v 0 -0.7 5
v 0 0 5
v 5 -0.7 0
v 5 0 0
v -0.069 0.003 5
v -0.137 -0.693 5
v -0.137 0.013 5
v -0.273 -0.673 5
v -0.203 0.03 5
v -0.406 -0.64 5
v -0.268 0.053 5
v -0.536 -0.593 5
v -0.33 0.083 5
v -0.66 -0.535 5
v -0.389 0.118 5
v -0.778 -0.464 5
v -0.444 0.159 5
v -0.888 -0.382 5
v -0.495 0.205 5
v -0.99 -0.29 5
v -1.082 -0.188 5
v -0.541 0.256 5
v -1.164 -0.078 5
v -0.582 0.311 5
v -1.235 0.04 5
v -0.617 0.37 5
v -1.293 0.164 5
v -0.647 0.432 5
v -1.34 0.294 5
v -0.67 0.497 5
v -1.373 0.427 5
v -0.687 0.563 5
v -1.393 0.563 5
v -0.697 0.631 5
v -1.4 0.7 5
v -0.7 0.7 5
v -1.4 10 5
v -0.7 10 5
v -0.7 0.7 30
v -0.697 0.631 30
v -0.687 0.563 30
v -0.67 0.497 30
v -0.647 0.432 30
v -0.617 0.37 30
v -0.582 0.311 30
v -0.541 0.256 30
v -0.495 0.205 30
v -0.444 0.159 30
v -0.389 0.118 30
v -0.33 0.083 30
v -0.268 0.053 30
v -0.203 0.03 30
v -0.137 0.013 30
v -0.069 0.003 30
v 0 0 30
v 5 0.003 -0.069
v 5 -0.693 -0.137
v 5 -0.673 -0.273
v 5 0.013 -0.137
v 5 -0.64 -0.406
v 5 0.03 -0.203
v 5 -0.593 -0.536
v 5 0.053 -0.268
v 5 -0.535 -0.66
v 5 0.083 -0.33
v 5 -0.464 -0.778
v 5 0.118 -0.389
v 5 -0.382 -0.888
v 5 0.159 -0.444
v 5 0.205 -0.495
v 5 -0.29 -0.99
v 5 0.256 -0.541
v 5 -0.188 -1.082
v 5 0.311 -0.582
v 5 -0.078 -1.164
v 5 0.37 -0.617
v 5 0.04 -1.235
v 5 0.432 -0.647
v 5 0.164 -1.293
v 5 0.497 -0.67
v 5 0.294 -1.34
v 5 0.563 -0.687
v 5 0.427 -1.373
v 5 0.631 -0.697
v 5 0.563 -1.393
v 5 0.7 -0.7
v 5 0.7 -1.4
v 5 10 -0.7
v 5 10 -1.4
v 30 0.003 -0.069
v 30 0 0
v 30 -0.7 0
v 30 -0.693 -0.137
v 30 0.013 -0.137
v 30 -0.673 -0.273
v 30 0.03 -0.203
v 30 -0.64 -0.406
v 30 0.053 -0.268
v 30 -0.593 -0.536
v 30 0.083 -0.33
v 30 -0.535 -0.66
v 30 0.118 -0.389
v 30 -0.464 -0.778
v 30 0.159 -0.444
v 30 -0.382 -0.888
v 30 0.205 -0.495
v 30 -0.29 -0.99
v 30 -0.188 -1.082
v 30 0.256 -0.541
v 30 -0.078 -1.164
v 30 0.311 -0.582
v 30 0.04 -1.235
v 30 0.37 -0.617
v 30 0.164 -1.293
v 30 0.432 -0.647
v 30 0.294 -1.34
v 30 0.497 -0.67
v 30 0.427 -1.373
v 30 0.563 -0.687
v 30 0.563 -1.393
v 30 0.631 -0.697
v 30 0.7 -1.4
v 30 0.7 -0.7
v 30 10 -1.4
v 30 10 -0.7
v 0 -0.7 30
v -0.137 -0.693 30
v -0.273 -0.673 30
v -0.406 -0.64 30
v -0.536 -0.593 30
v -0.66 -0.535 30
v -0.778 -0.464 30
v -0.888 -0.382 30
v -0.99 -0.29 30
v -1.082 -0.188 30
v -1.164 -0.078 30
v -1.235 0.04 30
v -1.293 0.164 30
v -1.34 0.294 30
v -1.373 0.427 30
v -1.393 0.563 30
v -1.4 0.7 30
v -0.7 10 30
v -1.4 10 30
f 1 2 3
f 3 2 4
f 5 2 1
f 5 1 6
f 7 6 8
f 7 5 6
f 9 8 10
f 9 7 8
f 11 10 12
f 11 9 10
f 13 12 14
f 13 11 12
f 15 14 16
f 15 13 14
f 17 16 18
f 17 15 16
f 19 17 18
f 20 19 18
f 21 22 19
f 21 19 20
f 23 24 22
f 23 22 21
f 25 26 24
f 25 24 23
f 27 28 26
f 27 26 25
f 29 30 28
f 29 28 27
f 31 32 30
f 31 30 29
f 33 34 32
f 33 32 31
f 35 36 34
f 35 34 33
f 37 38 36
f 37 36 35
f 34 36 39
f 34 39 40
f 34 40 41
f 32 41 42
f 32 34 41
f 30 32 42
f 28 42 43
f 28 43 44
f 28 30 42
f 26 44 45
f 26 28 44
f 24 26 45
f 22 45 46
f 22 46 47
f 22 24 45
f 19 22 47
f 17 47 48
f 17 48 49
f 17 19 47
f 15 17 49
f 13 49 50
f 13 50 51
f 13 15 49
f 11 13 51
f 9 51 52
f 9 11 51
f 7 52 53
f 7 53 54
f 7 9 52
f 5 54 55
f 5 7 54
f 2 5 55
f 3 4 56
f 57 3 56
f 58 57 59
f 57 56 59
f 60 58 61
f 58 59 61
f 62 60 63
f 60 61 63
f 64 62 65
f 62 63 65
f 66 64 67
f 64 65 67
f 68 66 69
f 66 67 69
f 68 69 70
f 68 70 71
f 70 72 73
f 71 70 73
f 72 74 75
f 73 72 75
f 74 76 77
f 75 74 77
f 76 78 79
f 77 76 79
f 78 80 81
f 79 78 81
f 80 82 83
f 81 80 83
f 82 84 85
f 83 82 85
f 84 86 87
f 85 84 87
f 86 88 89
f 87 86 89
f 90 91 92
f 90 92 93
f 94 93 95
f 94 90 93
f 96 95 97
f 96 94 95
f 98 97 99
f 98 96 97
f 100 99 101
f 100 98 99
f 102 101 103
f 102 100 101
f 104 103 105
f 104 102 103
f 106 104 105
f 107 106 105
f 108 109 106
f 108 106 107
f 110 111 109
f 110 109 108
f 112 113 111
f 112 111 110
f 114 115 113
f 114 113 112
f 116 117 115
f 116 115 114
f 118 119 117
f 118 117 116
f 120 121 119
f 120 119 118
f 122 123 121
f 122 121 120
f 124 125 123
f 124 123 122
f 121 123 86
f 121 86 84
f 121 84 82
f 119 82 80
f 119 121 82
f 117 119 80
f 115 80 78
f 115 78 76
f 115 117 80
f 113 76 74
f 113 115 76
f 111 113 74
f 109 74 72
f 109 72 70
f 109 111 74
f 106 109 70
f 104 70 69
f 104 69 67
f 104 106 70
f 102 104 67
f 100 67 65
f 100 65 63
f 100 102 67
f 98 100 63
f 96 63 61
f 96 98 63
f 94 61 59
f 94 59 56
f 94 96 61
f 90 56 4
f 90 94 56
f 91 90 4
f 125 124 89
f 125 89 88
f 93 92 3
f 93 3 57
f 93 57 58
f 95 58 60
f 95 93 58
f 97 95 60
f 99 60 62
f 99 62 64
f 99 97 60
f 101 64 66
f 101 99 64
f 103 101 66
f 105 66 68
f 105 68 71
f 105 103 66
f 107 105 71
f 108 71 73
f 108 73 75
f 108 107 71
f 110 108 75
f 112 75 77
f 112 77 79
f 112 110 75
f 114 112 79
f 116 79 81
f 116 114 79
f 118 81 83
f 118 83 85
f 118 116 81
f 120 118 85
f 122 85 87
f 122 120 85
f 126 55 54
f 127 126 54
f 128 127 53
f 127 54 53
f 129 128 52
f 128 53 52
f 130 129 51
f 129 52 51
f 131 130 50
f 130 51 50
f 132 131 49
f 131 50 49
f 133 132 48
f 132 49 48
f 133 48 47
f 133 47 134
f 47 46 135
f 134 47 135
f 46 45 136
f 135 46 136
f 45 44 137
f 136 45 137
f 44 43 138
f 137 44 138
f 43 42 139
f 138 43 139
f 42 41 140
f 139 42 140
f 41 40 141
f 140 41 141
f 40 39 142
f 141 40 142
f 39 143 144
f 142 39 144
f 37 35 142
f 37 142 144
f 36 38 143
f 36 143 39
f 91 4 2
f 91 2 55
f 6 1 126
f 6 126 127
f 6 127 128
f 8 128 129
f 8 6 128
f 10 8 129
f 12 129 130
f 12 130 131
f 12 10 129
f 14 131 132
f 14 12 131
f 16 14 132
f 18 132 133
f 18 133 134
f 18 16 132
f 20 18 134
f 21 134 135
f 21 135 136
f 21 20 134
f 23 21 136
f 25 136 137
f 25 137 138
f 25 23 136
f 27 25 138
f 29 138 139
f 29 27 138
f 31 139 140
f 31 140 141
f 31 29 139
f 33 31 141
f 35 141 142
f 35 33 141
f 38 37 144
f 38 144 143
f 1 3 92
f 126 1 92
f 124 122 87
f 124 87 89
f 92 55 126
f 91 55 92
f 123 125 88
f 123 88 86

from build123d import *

# Parameters (mm, degrees)
BASE_FLANGE1_DEPTH      = 0.7
BREAK_CORNER1_OUTLINE_W = 10
BREAK_CORNER1_OUTLINE_H = 3
BREAK_CORNER1_DEPTH     = 3.535533906
EDGE_FLANGE2_DEPTH      = 25
EDGE_FLANGE2_BEND_DEPTH = 25


# Read off the part's stored shape, not the designer's step: Break-Corner1
# Sheet-metal steps are written as plain solids
with BuildPart() as part:
    # Sketch2 → Base-Flange1 (new body)
    with BuildSketch(Plane(origin=(0, 0, 0), x_dir=(1, 0, 0), z_dir=(0, 1, 0))):
        Polygon((0, 0), (0, -30), (30, 0), align=None)
    extrude(amount=-BASE_FLANGE1_DEPTH)

    # Break-Corner1 outline → Break-Corner1 (cut)
    with BuildSketch(Plane(origin=(0, 0, 0), x_dir=(0.7071067811865471, 0, -0.707106781186548), z_dir=(0.707106781186548, 0, 0.707106781186547))):
        with Locations((0, -0.5)):
            Rectangle(BREAK_CORNER1_OUTLINE_W, BREAK_CORNER1_OUTLINE_H)
    extrude(amount=BREAK_CORNER1_DEPTH, mode=Mode.SUBTRACT)

    # Edge-Flange2 section (across the edge) → Edge-Flange2 (add)
    with BuildSketch(Plane(origin=(-0.7, 0, 5), x_dir=(1, 0, 0), z_dir=(0, 0, 1))):
        with BuildLine():
            Line((-0.7, 0.7), (-0.7, 10))
            Line((-0.7, 10), (0, 10))
            Line((0, 10), (0, 0.7))
            ThreePointArc((0, 0.7), (0.205025253, 0.205025253), (0.7, 0))
            Line((0.7, 0), (0.7, -0.7))
            ThreePointArc((0.7, -0.7), (-0.289949494, -0.289949494), (-0.7, 0.7))
        make_face()
    extrude(amount=EDGE_FLANGE2_DEPTH)

    # Edge-Flange2 section 2 (across the edge) → Edge-Flange2 bend (add)
    with BuildSketch(Plane(origin=(30, 0, -0.7), x_dir=(0, 0, 1), z_dir=(-1, 0, 0))):
        with BuildLine():
            Line((-0.7, 0.7), (-0.7, 10))
            Line((-0.7, 10), (0, 10))
            Line((0, 10), (0, 0.7))
            ThreePointArc((0, 0.7), (0.205025253, 0.205025253), (0.7, 0))
            Line((0.7, 0), (0.7, -0.7))
            ThreePointArc((0.7, -0.7), (-0.289949494, -0.289949494), (-0.7, 0.7))
        make_face()
    extrude(amount=EDGE_FLANGE2_BEND_DEPTH)


solid = part.part
